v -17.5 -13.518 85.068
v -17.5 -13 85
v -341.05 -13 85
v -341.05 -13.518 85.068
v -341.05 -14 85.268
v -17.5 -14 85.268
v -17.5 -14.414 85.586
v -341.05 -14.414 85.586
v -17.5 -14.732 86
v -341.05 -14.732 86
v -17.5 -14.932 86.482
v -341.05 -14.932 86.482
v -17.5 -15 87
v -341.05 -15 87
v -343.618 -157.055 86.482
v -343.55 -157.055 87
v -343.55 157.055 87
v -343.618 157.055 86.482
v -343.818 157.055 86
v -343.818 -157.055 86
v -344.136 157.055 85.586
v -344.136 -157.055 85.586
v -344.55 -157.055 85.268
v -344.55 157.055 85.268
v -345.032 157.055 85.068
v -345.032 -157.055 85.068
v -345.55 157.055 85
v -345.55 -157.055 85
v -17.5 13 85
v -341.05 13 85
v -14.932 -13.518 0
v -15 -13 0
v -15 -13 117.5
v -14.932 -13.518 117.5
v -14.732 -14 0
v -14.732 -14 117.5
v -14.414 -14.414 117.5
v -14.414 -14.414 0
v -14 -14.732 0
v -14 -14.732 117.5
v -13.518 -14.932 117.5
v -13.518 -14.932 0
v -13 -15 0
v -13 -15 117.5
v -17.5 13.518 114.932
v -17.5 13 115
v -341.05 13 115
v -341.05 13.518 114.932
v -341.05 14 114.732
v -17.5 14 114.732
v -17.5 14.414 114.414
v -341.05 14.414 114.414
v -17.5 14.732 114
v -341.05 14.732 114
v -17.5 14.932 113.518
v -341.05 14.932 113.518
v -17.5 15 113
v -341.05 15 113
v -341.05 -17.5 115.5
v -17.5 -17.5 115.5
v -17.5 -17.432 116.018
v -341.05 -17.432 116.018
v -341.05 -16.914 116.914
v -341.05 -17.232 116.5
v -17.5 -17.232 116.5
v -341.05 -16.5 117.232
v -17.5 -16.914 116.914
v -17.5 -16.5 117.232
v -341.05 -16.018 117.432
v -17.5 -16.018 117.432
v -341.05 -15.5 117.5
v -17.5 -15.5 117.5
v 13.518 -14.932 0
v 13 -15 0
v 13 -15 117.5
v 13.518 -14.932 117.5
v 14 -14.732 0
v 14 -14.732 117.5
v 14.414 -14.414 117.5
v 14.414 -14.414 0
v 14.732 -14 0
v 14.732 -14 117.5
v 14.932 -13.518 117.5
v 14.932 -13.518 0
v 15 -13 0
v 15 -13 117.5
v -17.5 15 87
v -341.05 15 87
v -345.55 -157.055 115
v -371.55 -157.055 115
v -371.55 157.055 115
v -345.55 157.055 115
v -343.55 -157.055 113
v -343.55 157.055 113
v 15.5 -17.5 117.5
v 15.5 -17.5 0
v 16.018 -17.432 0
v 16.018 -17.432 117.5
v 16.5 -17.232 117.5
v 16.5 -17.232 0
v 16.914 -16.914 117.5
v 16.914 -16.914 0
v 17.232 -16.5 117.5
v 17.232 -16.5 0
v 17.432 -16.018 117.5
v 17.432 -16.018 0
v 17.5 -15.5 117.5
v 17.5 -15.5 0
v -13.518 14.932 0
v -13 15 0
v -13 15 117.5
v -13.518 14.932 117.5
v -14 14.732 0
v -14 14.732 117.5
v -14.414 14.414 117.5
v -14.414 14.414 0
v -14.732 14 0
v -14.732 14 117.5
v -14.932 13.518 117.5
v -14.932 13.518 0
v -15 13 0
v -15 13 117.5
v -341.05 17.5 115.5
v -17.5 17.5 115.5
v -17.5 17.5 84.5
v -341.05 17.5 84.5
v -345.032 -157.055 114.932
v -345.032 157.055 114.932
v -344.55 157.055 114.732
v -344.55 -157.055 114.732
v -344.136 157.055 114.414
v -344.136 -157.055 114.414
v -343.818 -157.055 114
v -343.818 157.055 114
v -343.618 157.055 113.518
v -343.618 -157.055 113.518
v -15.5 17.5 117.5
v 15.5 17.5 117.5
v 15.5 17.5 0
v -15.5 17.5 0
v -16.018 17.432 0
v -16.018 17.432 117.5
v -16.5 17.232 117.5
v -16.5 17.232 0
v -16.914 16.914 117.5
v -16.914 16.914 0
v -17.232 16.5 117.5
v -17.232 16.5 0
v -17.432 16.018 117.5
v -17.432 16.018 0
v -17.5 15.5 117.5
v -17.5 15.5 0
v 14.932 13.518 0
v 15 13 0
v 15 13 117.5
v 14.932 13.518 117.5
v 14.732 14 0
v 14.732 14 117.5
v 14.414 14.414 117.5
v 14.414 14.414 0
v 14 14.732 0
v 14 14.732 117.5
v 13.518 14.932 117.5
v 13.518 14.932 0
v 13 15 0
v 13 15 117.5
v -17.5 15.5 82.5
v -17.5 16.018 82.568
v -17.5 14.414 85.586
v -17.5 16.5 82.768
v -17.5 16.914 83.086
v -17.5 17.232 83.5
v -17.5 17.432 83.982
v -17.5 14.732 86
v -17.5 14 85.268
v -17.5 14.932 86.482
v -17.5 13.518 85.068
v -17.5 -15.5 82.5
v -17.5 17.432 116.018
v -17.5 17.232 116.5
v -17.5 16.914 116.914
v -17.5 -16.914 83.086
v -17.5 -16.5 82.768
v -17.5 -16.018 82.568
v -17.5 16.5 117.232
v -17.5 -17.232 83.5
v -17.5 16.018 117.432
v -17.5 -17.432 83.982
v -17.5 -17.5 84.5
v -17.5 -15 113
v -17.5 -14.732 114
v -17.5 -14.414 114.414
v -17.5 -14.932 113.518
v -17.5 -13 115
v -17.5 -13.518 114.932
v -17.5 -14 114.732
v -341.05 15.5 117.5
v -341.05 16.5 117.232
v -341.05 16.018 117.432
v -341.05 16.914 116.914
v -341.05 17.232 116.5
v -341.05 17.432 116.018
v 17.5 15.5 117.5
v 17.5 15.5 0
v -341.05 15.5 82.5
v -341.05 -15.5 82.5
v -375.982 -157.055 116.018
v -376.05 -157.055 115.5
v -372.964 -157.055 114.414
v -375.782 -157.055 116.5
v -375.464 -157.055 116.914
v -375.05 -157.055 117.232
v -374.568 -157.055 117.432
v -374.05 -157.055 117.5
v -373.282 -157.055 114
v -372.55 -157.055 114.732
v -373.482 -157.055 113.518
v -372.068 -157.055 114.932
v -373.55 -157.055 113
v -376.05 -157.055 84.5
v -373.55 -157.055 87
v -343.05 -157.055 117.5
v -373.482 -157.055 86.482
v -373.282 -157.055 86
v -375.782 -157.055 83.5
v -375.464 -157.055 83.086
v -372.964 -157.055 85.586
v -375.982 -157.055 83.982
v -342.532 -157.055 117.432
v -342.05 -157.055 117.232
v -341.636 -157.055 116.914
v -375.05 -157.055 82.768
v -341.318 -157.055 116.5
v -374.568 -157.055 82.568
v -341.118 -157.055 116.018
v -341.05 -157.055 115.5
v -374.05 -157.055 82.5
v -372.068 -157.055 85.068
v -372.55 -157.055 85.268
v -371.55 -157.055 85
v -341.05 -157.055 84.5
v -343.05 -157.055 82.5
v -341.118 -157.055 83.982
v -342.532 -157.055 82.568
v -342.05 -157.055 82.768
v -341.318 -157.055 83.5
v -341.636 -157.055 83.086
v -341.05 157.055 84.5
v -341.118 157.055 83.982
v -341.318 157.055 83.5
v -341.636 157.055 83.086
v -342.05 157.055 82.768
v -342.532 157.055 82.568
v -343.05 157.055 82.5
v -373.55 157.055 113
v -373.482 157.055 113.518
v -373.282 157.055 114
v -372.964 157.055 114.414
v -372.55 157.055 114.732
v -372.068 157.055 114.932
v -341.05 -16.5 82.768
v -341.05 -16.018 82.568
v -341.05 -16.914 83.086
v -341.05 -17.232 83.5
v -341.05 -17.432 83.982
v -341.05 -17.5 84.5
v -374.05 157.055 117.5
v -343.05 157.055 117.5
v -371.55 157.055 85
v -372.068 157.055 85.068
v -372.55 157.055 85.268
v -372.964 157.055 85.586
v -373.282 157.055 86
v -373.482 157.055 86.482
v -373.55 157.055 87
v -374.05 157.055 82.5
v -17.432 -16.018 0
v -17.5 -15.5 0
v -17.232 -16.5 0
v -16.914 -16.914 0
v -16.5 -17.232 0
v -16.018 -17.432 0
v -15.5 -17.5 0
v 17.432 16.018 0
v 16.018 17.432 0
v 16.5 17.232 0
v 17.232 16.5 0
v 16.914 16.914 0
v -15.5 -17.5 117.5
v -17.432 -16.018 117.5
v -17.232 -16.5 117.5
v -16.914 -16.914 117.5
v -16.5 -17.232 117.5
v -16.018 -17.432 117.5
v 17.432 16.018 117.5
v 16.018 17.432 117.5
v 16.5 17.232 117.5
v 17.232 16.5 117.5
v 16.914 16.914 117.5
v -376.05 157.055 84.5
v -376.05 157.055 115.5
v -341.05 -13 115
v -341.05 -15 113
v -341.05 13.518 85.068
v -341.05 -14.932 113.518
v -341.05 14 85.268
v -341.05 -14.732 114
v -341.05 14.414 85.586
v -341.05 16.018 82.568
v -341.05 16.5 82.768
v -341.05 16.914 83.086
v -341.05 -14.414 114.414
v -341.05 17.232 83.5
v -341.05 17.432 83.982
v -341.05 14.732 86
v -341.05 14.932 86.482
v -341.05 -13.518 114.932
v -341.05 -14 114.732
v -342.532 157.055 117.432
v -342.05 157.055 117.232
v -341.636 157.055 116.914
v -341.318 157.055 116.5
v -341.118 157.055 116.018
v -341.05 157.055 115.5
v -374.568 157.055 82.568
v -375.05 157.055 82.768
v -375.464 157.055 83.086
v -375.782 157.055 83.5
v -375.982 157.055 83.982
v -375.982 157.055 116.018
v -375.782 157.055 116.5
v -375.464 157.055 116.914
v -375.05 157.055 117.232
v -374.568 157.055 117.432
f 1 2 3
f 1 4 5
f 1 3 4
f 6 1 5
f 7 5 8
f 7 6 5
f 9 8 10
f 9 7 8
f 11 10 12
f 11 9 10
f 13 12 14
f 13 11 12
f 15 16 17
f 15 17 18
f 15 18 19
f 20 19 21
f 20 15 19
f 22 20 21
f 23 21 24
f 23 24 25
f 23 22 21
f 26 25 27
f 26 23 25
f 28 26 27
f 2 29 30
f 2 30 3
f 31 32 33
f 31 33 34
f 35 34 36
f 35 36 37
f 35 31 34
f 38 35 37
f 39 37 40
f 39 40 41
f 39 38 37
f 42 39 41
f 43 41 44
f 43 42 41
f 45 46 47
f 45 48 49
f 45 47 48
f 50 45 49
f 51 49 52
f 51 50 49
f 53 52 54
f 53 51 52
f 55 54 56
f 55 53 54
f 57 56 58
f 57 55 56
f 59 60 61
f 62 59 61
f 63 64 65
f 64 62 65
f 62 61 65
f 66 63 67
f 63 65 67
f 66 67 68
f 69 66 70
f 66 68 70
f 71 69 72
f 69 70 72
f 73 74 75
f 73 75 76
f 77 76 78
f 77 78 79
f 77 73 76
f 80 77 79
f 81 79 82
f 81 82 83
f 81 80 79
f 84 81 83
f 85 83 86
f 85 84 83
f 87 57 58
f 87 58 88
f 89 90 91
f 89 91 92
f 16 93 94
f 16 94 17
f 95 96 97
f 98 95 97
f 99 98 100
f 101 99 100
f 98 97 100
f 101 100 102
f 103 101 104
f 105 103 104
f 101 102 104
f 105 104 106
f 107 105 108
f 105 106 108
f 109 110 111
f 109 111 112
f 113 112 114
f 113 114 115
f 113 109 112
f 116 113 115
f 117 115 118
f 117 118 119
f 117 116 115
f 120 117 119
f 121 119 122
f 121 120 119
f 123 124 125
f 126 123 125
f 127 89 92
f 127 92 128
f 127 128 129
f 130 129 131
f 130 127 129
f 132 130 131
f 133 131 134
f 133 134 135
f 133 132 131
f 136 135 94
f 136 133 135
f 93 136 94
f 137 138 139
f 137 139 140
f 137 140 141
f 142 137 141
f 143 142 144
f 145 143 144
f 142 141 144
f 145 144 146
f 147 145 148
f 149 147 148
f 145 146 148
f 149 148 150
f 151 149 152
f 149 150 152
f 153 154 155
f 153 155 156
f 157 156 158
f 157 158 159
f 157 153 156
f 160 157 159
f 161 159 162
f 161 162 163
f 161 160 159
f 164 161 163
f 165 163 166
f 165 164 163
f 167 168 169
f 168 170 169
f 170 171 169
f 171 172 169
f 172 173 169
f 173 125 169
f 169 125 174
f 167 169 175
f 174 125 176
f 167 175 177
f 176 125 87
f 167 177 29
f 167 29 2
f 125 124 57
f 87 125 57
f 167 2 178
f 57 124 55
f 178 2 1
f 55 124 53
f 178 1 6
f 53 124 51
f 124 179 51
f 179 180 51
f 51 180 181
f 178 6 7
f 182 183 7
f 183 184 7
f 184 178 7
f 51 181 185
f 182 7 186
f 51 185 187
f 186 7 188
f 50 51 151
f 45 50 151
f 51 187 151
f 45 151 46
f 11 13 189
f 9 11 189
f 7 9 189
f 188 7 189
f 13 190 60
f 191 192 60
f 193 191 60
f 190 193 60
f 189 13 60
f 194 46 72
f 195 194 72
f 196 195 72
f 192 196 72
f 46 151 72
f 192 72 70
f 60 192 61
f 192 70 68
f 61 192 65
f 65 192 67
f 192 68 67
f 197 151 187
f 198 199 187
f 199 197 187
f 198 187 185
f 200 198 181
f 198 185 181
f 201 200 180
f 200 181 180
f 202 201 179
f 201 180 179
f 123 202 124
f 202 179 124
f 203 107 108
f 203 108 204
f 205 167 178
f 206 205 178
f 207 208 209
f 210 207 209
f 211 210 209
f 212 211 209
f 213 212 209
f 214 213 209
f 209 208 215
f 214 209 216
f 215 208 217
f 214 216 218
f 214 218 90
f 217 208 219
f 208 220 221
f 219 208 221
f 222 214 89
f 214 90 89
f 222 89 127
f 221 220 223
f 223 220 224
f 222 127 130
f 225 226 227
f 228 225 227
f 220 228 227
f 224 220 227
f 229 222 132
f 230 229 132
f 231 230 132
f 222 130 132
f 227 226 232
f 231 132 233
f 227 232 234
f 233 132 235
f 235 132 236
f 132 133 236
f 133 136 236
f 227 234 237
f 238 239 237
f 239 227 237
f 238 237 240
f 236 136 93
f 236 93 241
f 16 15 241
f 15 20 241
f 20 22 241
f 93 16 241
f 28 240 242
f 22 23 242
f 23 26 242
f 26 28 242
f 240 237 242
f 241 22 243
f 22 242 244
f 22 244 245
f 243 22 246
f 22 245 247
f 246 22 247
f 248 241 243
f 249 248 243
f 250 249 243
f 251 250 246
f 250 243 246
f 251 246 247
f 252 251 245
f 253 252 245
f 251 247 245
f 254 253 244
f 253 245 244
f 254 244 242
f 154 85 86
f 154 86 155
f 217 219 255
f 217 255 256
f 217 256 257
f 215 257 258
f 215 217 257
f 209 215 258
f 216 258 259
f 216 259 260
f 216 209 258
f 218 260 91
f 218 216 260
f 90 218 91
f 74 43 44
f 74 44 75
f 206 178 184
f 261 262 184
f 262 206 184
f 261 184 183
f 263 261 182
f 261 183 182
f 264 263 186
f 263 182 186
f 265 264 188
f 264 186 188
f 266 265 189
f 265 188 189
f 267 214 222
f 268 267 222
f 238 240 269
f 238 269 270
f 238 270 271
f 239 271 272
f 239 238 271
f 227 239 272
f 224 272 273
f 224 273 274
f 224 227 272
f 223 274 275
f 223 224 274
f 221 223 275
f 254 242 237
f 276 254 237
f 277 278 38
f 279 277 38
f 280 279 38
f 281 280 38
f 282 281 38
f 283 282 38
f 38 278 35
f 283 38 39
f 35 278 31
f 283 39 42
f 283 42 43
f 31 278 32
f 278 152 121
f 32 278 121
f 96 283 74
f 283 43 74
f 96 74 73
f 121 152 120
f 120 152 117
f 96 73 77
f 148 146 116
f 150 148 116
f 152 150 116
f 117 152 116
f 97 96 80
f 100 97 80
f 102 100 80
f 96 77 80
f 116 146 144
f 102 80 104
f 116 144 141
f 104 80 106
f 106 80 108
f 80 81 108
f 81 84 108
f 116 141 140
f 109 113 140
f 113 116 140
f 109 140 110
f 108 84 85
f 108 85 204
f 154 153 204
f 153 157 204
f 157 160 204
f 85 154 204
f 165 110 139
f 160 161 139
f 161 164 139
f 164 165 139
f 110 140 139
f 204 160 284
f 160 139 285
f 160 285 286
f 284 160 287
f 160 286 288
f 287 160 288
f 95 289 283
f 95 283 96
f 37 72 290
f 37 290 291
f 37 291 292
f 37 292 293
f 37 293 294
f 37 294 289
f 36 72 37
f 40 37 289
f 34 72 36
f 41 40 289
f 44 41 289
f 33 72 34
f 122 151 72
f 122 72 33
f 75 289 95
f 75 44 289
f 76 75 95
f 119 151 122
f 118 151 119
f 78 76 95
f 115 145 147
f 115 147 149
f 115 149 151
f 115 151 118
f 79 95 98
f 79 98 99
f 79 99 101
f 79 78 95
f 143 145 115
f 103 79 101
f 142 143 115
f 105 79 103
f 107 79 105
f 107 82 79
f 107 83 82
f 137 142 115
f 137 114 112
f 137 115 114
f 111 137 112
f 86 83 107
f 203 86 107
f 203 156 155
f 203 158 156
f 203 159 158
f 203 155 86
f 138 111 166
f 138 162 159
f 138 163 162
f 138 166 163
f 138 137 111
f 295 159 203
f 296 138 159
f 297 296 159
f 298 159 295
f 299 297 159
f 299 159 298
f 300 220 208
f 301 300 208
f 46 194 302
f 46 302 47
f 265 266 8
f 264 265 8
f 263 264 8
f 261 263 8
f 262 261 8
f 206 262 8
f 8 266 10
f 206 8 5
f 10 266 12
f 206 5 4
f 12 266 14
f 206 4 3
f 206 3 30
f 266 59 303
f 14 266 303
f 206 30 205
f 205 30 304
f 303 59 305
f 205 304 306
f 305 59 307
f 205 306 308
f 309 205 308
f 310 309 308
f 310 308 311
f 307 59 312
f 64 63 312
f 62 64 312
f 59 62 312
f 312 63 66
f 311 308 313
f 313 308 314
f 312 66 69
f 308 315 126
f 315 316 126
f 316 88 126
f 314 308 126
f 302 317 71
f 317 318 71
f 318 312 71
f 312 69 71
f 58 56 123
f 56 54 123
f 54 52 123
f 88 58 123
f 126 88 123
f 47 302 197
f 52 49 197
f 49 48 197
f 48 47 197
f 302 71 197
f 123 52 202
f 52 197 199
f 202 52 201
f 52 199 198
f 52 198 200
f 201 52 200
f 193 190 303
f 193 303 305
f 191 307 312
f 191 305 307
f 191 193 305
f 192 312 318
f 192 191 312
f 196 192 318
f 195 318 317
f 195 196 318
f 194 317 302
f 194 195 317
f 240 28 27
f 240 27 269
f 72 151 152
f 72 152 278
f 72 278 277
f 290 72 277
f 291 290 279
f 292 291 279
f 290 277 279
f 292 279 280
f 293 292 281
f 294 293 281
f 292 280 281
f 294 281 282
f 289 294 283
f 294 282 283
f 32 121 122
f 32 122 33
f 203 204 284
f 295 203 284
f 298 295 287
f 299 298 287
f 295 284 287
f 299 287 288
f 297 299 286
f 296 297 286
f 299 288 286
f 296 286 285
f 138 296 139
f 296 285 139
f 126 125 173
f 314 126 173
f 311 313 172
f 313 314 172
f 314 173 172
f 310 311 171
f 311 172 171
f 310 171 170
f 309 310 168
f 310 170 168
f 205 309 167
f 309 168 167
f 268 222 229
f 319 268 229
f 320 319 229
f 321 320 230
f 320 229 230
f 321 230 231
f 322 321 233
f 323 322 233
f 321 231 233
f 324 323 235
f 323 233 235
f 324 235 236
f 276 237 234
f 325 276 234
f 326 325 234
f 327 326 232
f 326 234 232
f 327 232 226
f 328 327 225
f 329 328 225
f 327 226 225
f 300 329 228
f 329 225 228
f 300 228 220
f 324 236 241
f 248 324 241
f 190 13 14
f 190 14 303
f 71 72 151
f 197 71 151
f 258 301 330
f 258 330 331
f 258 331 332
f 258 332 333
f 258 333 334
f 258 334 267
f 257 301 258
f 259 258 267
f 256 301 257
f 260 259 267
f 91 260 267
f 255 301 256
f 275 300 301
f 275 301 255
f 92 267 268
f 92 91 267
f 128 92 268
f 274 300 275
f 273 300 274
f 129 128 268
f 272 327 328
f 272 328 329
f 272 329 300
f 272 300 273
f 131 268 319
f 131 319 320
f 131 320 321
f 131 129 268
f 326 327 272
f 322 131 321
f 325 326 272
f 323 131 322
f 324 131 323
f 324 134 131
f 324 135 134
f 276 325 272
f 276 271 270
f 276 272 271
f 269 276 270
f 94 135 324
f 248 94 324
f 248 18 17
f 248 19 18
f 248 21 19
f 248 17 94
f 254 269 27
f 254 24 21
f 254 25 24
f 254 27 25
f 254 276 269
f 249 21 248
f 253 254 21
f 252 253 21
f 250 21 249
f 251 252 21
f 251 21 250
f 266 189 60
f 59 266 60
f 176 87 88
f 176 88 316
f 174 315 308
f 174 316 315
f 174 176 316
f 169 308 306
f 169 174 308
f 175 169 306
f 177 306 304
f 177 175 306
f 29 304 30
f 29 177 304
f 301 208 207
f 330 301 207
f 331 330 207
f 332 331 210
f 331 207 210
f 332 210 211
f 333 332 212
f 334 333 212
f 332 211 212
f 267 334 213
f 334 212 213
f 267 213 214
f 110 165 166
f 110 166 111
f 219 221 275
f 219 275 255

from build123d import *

# Parameters (mm, degrees)
CUSTOM_TUBE_CARRE_35_2_5_1_DEPTH   = 117.5
CUSTOM_TUBE_CARRE_35_2_5_1_2_DEPTH = 360.55
CUSTOM_TUBE_CARRE_35_2_5_1_3_DEPTH = 314.11


with BuildPart() as part:
    # Esquisse1 → Custom TUBE-CARRE-35-2.5(1) (new body)
    with BuildSketch(Plane.XY):
        with BuildLine():
            Line((-15.5, -17.5), (15.5, -17.5))
            ThreePointArc((15.5, -17.5), (16.914213562, -16.914213562), (17.5, -15.5))
            Line((17.5, -15.5), (17.5, 15.5))
            ThreePointArc((17.5, 15.5), (16.914213562, 16.914213562), (15.5, 17.5))
            Line((15.5, 17.5), (-15.5, 17.5))
            ThreePointArc((-15.5, 17.5), (-16.914213562, 16.914213562), (-17.5, 15.5))
            Line((-17.5, 15.5), (-17.5, -15.5))
            ThreePointArc((-17.5, -15.5), (-16.914213562, -16.914213562), (-15.5, -17.5))
        make_face()
        with BuildLine():
            Line((-13, -15), (13, -15))
            ThreePointArc((13, -15), (14.414213562, -14.414213562), (15, -13))
            Line((15, -13), (15, 13))
            ThreePointArc((15, 13), (14.414213562, 14.414213562), (13, 15))
            Line((13, 15), (-13, 15))
            ThreePointArc((-13, 15), (-14.414213562, 14.414213562), (-15, 13))
            Line((-15, 13), (-15, -13))
            ThreePointArc((-15, -13), (-14.414213562, -14.414213562), (-13, -15))
        make_face(mode=Mode.SUBTRACT)
    extrude(amount=CUSTOM_TUBE_CARRE_35_2_5_1_DEPTH)


with BuildPart() as body_2:
    # Esquisse1 on segment 2 (carried to segment 2) → Custom TUBE-CARRE-35-2.5_1 2 (new body)
    with BuildSketch(Plane(origin=(1, 0, 100), x_dir=(0, 0, 1), z_dir=(-1, 0, 0))):
        with BuildLine():
            Line((-15.5, -17.5), (15.5, -17.5))
            ThreePointArc((15.5, -17.5), (16.914213562, -16.914213562), (17.5, -15.5))
            Line((17.5, -15.5), (17.5, 15.5))
            ThreePointArc((17.5, 15.5), (16.914213562, 16.914213562), (15.5, 17.5))
            Line((15.5, 17.5), (-15.5, 17.5))
            ThreePointArc((-15.5, 17.5), (-16.914213562, 16.914213562), (-17.5, 15.5))
            Line((-17.5, 15.5), (-17.5, -15.5))
            ThreePointArc((-17.5, -15.5), (-16.914213562, -16.914213562), (-15.5, -17.5))
        make_face()
        with BuildLine():
            Line((-13, -15), (13, -15))
            ThreePointArc((13, -15), (14.414213562, -14.414213562), (15, -13))
            Line((15, -13), (15, 13))
            ThreePointArc((15, 13), (14.414213562, 14.414213562), (13, 15))
            Line((13, 15), (-13, 15))
            ThreePointArc((-13, 15), (-14.414213562, 14.414213562), (-15, 13))
            Line((-15, 13), (-15, -13))
            ThreePointArc((-15, -13), (-14.414213562, -14.414213562), (-13, -15))
        make_face(mode=Mode.SUBTRACT)
    extrude(amount=CUSTOM_TUBE_CARRE_35_2_5_1_2_DEPTH)

    # Custom TUBE-CARRE-35-2.5_1 2 end butt 1
    split(bisect_by=Plane(origin=(-17.5, 0, 100), x_dir=(0, -1, 0), z_dir=(-1, 0, 0)), keep=Keep.TOP)

    # Custom TUBE-CARRE-35-2.5_1 2 end butt 2
    split(bisect_by=Plane(origin=(-341.05, 0, 100), x_dir=(0, 1, 0), z_dir=(1, 0, 0)), keep=Keep.TOP)


with BuildPart() as body_3:
    # Esquisse1 on segment 3 (carried to segment 3) → Custom TUBE-CARRE-35-2.5_1 3 (new body)
    with BuildSketch(Plane(origin=(-358.55, -157.055, 100), x_dir=(1, 0, 0), z_dir=(0, 1, 0))):
        with BuildLine():
            Line((-15.5, -17.5), (15.5, -17.5))
            ThreePointArc((15.5, -17.5), (16.914213562, -16.914213562), (17.5, -15.5))
            Line((17.5, -15.5), (17.5, 15.5))
            ThreePointArc((17.5, 15.5), (16.914213562, 16.914213562), (15.5, 17.5))
            Line((15.5, 17.5), (-15.5, 17.5))
            ThreePointArc((-15.5, 17.5), (-16.914213562, 16.914213562), (-17.5, 15.5))
            Line((-17.5, 15.5), (-17.5, -15.5))
            ThreePointArc((-17.5, -15.5), (-16.914213562, -16.914213562), (-15.5, -17.5))
        make_face()
        with BuildLine():
            Line((-13, -15), (13, -15))
            ThreePointArc((13, -15), (14.414213562, -14.414213562), (15, -13))
            Line((15, -13), (15, 13))
            ThreePointArc((15, 13), (14.414213562, 14.414213562), (13, 15))
            Line((13, 15), (-13, 15))
            ThreePointArc((-13, 15), (-14.414213562, 14.414213562), (-15, 13))
            Line((-15, 13), (-15, -13))
            ThreePointArc((-15, -13), (-14.414213562, -14.414213562), (-13, -15))
        make_face(mode=Mode.SUBTRACT)
    extrude(amount=CUSTOM_TUBE_CARRE_35_2_5_1_3_DEPTH)


solid = Compound([part.part, body_2.part, body_3.part])
